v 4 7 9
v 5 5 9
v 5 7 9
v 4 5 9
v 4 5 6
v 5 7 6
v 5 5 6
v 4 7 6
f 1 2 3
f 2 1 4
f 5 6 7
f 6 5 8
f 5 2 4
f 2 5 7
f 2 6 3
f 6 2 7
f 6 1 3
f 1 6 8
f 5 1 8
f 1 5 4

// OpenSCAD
X_Dimension = 1;
Y_Dimension = 2;
Z_Dimension = 3;

X_Offset = 4;
Y_Offset = 5;
Z_Offset = 6;

module mycube(length,width,height,movex,movey,movez) {translate([movex,movey,movez]){cube([length,width,height]);}}

mycube(X_Dimension,Y_Dimension,Z_Dimension,X_Offset,Y_Offset,Z_Offset);
